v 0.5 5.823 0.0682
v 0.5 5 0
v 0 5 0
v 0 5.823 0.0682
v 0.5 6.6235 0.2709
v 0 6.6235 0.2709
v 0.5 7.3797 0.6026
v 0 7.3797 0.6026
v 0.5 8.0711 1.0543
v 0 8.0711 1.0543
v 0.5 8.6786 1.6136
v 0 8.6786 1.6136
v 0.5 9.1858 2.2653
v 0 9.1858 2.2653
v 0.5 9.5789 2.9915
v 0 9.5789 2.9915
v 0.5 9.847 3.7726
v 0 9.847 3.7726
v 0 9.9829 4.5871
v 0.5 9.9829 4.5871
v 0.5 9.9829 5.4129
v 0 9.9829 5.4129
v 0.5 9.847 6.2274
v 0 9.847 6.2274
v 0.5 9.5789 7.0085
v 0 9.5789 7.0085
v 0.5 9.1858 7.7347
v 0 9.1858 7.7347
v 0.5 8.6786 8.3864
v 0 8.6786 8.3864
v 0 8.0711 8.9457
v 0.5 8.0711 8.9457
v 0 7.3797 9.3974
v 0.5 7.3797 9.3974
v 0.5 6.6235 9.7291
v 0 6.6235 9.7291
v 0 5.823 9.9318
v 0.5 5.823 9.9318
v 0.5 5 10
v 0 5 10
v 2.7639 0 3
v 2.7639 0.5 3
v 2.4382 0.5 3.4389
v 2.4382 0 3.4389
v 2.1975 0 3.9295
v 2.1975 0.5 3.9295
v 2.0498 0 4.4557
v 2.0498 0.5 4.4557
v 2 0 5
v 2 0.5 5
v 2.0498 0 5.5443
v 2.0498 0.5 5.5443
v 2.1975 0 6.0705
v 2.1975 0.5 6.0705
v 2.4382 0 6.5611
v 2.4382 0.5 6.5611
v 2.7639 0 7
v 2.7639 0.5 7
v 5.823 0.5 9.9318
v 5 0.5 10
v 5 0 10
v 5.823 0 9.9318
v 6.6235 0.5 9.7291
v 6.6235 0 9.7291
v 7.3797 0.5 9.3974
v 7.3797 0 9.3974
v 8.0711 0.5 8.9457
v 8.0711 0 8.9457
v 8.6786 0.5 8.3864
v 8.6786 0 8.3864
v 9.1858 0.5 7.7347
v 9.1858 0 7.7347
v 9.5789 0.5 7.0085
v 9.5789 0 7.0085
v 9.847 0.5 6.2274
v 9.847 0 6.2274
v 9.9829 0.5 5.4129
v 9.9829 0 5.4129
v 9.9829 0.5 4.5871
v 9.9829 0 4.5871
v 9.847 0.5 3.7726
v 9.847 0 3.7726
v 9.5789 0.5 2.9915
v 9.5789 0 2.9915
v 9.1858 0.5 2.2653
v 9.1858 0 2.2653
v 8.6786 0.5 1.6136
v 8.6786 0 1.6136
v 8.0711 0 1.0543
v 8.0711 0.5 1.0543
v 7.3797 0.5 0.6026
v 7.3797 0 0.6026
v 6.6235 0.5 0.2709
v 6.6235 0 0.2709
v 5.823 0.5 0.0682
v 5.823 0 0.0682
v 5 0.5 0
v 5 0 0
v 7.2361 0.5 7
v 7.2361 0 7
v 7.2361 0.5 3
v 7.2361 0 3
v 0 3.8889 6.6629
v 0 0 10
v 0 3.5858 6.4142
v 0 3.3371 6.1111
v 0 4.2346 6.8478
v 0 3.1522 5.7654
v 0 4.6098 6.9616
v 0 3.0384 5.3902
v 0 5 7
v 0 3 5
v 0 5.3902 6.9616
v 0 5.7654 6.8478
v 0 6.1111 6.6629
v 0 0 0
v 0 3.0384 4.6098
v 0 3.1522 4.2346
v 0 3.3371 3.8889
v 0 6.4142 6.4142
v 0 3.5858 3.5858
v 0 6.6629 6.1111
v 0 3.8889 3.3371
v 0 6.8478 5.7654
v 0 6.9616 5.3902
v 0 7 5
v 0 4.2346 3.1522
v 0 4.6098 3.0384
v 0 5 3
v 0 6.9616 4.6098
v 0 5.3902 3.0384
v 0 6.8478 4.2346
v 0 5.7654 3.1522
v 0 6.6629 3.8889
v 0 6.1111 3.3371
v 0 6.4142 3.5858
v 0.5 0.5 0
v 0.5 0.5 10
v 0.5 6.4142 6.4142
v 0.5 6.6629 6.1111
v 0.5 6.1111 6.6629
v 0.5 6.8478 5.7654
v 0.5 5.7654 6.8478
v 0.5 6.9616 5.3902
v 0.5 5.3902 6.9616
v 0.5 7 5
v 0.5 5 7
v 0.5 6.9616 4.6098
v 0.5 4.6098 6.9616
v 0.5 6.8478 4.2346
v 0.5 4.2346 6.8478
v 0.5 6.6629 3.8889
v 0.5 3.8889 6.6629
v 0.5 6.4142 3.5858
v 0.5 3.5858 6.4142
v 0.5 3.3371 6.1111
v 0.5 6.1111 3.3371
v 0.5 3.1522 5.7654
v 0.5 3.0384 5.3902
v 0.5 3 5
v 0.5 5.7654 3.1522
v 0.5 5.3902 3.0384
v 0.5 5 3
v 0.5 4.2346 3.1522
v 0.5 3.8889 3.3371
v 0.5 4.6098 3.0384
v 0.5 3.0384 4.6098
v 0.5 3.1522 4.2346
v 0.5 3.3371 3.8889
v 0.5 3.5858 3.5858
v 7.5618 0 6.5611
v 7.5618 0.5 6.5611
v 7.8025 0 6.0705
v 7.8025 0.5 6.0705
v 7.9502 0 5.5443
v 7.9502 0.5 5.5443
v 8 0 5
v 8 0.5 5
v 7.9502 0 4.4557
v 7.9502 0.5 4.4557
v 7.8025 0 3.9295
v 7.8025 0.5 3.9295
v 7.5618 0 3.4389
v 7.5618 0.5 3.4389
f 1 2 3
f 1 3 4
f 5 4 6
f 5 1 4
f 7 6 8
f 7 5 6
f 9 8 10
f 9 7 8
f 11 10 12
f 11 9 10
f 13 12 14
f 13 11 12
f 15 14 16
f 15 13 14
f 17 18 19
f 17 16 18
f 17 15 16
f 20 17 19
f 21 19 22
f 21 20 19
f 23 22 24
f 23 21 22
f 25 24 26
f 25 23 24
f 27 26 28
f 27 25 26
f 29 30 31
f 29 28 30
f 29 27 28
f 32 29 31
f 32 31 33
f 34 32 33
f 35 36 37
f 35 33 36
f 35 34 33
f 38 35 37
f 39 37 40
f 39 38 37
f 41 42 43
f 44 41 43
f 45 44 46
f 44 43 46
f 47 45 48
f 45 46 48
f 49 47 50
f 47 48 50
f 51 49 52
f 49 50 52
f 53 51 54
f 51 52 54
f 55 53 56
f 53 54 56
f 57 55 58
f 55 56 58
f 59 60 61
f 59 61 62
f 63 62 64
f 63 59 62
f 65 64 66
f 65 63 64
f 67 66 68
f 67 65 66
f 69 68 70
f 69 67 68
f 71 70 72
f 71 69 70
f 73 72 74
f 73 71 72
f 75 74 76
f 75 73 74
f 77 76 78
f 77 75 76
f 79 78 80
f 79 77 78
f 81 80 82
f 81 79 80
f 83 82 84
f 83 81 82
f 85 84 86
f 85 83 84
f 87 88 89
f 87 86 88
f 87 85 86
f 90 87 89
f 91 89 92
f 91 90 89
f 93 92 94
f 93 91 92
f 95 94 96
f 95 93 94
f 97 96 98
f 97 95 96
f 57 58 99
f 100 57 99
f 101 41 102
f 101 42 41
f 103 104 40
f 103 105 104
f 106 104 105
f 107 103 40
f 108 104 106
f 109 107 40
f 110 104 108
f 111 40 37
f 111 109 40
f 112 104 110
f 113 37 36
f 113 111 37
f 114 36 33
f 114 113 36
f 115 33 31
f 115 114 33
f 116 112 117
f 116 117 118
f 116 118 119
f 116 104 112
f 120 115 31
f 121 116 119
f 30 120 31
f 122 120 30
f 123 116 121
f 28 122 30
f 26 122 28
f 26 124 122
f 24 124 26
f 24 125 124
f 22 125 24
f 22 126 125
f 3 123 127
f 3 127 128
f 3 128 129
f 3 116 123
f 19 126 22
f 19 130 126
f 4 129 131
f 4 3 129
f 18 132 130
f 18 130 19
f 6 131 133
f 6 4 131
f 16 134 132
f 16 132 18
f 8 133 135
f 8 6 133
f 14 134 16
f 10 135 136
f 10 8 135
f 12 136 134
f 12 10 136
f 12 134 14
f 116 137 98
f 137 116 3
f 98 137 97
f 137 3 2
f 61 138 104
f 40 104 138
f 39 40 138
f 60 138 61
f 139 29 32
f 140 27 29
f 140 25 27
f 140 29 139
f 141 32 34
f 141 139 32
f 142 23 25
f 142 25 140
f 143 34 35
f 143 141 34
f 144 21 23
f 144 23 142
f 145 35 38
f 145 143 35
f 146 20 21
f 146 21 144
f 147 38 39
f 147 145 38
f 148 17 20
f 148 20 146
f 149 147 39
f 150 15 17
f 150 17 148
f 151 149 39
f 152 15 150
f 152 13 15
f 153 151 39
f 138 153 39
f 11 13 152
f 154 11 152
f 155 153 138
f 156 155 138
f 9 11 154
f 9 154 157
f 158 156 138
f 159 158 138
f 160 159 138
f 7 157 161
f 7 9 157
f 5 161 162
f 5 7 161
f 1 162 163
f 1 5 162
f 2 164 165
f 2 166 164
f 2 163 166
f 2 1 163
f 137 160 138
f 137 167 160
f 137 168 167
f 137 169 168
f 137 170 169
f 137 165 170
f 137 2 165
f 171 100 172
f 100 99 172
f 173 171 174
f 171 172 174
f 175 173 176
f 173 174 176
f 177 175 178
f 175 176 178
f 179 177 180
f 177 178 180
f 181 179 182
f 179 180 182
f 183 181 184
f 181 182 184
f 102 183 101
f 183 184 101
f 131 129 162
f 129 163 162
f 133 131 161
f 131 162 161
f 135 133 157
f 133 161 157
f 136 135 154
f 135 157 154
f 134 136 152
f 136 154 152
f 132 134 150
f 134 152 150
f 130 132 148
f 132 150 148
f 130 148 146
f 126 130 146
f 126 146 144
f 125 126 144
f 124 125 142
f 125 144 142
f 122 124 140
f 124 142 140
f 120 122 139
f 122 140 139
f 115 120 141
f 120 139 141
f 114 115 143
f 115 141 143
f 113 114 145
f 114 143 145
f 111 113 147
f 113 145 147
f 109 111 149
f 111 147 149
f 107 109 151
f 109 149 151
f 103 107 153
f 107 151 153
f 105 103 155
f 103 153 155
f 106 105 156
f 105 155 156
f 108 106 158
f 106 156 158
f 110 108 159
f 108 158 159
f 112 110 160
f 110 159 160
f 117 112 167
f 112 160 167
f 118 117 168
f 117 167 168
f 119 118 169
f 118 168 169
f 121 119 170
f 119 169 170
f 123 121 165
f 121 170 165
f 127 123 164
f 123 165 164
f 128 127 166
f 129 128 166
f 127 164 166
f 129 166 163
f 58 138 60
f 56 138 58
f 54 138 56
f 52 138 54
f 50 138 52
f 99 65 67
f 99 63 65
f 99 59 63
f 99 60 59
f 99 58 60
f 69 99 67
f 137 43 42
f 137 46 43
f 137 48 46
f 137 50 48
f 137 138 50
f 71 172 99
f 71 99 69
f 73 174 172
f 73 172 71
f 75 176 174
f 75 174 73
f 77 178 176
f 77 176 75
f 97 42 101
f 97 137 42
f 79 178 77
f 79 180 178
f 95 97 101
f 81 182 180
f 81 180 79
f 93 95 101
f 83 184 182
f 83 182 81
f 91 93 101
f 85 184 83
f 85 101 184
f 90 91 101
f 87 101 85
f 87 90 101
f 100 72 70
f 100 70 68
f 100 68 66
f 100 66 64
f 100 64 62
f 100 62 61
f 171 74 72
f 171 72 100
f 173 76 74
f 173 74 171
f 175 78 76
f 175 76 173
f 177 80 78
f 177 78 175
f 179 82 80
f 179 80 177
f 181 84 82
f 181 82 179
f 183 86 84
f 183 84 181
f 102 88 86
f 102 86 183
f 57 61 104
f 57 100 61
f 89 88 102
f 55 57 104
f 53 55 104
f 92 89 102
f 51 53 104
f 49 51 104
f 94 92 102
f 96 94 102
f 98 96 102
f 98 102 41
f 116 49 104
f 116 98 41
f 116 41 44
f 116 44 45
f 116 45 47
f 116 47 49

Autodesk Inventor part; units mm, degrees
ref_plane "YZ Plane" through (0, 0, 0) normal (1, 0, 0) x (0, 1, 0)
ref_plane "XZ Plane" through (0, 0, 0) normal (0, 1, 0) x (-1, 0, 0)
ref_plane "XY Plane" through (0, 0, 0) normal (0, 0, 1) x (1, 0, 0)
sketch "Náčrt1" plane through (0, 0, 0) normal (0, 0, 1) x (1, 0, 0)
  line L0 (1.3202, 0) -> (0, 0)
  line L1 (0, 0) -> (0, 10)
  line L2 (0, 10) -> (0.5, 10)
  line L3 (0.5, 10) -> (0.5, 0.5)
  line L4 (0.5, 0.5) -> (10, 0.5)
  line L5 (10, 0.5) -> (10, 0)
  line L6 (10, 0) -> (1.3202, 0)
  point P0 (10, 0.25)
  point P1 (0.25, 10)
  dimension "d0" = 0.5
  dimension "d1" = 0.5
  dimension "d2" = 10
  dimension "d3" = 10
extrude "Vysunutí1" add sketch "Náčrt1" along normal blind 10
sketch "Náčrt2" plane through (0.5, 0.5, 0) normal (0, 1, 0) x (1, 0, 0)
  line L0 (9.5, 0) -> (0, 0) projected
  line L1 (9.5, 0) -> (9.5, -10) projected
  line L2 (2.2639, -3) -> (6.7361, -3)
  line L3 (2.2639, -7) -> (6.7361, -7)
  arc A0 (2.2639, -3) -> (2.2639, -7) centre (4.5, -5) ccw
  arc A1 (6.7361, -7) -> (6.7361, -3) centre (4.5, -5) ccw
  point P0 (-0.5, 0)
  point P1 (4.8669, -7)
  dimension "d7" = 5
  dimension "d8" = 5
  dimension "d9" = 2
  dimension "d10" = 4
extrude "Vysunutí2" cut sketch "Náčrt2" against normal through all
pattern_linear "Obdélníkové pole1" count 10 spacing 10 along (0, 0, 1) of "Vysunutí2"
sketch "Náčrt4" plane through (0.5, 0.5, 0) normal (1, 0, 0) x (0, 0, -1)
  line L0 (0, 0) -> (0, 9.5) projected
  line L1 (0, 9.5) -> (-10, 9.5) projected
  line L2 (-10, 0) -> (-10, 9.5) projected
  circle A0 centre (-5, 4.5) radius 2
  point P0 (0, -0.5)
  point P1 (-5, 9.5)
  point P2 (0, 4.5)
  point P3 (-10, 4.5)
  point P4 (-95, 9.5)
  dimension "d30" = 4
extrude "Vysunutí4" cut sketch "Náčrt4" against normal blind 10
sketch "Náčrt5" plane through (0.5, 0.5, 10) normal (1, 0, 0) x (0, 0, -1)
  circle A0 centre (5, 4.5) radius 2
  line L0 (10, 9.5) -> (0, 9.5) projected
  line L1 (0, 0) -> (0, 9.5) projected
  point P0 (10, -0.5)
  point P1 (95, 9.5)
  point P2 (5, 9.5)
  point P3 (0, 4.5)
  dimension "d33" = 4
  dimension "d34" = 5
  dimension "d35" = 5
extrude "Vysunutí5" cut sketch "Náčrt5" against normal blind 10
pattern_linear "Obdélníkové pole3" count 10 spacing 10 along (0, 0, -1) of "Vysunutí5"
sketch "Náčrt6" plane through (0.5, 0.5, 0) normal (0, 1, 0) x (1, 0, 0)
  circle A0 centre (4.5, -5) radius 5
  line L0 (9.5, 0) -> (9.5, -10) projected
  line L1 (9.5, -10) -> (0, -10) projected
  line L2 (-0.5, 0) -> (9.5, 0) projected
  line L3 (9.5, 0) -> (0, 0) projected
  line L4 (4.5, 0) -> (9.5, 0)
  line L5 (9.5, 0) -> (9.5, -10)
  point P0 (4.5, 0)
  point P1 (9.5, -5)
  point P2 (4.5, -10)
  dimension "d44" = 10
  dimension "d45" = 5
  dimension "d46" = 5
extrude "Vysunutí6" cut sketch "Náčrt6" against normal blind 10 contours L0 L1 A0 | A0 L2 L0
sketch "Náčrt7" plane through (0.5, 0.5, 0) normal (1, 0, 0) x (0, 0, -1)
  circle A0 centre (-5, 4.5) radius 5
  line L0 (0, 0) -> (0, 9.5) projected
  line L1 (-10, 0) -> (-10, 9.5) projected
  line L2 (0, 9.5) -> (-10, 9.5) projected
  point P0 (0, -0.5)
  point P1 (-5, 9.5)
  point P2 (0, 4.5)
  point P3 (-10, 4.5)
  dimension "d49" = 10
  dimension "d50" = 5
  dimension "d51" = 5
  dimension "d52" = 5
extrude "Vysunutí7" cut sketch "Náčrt7" against normal blind 10 contours A0 L2 L0 | A0 L1 L2
properties part number "1001"
